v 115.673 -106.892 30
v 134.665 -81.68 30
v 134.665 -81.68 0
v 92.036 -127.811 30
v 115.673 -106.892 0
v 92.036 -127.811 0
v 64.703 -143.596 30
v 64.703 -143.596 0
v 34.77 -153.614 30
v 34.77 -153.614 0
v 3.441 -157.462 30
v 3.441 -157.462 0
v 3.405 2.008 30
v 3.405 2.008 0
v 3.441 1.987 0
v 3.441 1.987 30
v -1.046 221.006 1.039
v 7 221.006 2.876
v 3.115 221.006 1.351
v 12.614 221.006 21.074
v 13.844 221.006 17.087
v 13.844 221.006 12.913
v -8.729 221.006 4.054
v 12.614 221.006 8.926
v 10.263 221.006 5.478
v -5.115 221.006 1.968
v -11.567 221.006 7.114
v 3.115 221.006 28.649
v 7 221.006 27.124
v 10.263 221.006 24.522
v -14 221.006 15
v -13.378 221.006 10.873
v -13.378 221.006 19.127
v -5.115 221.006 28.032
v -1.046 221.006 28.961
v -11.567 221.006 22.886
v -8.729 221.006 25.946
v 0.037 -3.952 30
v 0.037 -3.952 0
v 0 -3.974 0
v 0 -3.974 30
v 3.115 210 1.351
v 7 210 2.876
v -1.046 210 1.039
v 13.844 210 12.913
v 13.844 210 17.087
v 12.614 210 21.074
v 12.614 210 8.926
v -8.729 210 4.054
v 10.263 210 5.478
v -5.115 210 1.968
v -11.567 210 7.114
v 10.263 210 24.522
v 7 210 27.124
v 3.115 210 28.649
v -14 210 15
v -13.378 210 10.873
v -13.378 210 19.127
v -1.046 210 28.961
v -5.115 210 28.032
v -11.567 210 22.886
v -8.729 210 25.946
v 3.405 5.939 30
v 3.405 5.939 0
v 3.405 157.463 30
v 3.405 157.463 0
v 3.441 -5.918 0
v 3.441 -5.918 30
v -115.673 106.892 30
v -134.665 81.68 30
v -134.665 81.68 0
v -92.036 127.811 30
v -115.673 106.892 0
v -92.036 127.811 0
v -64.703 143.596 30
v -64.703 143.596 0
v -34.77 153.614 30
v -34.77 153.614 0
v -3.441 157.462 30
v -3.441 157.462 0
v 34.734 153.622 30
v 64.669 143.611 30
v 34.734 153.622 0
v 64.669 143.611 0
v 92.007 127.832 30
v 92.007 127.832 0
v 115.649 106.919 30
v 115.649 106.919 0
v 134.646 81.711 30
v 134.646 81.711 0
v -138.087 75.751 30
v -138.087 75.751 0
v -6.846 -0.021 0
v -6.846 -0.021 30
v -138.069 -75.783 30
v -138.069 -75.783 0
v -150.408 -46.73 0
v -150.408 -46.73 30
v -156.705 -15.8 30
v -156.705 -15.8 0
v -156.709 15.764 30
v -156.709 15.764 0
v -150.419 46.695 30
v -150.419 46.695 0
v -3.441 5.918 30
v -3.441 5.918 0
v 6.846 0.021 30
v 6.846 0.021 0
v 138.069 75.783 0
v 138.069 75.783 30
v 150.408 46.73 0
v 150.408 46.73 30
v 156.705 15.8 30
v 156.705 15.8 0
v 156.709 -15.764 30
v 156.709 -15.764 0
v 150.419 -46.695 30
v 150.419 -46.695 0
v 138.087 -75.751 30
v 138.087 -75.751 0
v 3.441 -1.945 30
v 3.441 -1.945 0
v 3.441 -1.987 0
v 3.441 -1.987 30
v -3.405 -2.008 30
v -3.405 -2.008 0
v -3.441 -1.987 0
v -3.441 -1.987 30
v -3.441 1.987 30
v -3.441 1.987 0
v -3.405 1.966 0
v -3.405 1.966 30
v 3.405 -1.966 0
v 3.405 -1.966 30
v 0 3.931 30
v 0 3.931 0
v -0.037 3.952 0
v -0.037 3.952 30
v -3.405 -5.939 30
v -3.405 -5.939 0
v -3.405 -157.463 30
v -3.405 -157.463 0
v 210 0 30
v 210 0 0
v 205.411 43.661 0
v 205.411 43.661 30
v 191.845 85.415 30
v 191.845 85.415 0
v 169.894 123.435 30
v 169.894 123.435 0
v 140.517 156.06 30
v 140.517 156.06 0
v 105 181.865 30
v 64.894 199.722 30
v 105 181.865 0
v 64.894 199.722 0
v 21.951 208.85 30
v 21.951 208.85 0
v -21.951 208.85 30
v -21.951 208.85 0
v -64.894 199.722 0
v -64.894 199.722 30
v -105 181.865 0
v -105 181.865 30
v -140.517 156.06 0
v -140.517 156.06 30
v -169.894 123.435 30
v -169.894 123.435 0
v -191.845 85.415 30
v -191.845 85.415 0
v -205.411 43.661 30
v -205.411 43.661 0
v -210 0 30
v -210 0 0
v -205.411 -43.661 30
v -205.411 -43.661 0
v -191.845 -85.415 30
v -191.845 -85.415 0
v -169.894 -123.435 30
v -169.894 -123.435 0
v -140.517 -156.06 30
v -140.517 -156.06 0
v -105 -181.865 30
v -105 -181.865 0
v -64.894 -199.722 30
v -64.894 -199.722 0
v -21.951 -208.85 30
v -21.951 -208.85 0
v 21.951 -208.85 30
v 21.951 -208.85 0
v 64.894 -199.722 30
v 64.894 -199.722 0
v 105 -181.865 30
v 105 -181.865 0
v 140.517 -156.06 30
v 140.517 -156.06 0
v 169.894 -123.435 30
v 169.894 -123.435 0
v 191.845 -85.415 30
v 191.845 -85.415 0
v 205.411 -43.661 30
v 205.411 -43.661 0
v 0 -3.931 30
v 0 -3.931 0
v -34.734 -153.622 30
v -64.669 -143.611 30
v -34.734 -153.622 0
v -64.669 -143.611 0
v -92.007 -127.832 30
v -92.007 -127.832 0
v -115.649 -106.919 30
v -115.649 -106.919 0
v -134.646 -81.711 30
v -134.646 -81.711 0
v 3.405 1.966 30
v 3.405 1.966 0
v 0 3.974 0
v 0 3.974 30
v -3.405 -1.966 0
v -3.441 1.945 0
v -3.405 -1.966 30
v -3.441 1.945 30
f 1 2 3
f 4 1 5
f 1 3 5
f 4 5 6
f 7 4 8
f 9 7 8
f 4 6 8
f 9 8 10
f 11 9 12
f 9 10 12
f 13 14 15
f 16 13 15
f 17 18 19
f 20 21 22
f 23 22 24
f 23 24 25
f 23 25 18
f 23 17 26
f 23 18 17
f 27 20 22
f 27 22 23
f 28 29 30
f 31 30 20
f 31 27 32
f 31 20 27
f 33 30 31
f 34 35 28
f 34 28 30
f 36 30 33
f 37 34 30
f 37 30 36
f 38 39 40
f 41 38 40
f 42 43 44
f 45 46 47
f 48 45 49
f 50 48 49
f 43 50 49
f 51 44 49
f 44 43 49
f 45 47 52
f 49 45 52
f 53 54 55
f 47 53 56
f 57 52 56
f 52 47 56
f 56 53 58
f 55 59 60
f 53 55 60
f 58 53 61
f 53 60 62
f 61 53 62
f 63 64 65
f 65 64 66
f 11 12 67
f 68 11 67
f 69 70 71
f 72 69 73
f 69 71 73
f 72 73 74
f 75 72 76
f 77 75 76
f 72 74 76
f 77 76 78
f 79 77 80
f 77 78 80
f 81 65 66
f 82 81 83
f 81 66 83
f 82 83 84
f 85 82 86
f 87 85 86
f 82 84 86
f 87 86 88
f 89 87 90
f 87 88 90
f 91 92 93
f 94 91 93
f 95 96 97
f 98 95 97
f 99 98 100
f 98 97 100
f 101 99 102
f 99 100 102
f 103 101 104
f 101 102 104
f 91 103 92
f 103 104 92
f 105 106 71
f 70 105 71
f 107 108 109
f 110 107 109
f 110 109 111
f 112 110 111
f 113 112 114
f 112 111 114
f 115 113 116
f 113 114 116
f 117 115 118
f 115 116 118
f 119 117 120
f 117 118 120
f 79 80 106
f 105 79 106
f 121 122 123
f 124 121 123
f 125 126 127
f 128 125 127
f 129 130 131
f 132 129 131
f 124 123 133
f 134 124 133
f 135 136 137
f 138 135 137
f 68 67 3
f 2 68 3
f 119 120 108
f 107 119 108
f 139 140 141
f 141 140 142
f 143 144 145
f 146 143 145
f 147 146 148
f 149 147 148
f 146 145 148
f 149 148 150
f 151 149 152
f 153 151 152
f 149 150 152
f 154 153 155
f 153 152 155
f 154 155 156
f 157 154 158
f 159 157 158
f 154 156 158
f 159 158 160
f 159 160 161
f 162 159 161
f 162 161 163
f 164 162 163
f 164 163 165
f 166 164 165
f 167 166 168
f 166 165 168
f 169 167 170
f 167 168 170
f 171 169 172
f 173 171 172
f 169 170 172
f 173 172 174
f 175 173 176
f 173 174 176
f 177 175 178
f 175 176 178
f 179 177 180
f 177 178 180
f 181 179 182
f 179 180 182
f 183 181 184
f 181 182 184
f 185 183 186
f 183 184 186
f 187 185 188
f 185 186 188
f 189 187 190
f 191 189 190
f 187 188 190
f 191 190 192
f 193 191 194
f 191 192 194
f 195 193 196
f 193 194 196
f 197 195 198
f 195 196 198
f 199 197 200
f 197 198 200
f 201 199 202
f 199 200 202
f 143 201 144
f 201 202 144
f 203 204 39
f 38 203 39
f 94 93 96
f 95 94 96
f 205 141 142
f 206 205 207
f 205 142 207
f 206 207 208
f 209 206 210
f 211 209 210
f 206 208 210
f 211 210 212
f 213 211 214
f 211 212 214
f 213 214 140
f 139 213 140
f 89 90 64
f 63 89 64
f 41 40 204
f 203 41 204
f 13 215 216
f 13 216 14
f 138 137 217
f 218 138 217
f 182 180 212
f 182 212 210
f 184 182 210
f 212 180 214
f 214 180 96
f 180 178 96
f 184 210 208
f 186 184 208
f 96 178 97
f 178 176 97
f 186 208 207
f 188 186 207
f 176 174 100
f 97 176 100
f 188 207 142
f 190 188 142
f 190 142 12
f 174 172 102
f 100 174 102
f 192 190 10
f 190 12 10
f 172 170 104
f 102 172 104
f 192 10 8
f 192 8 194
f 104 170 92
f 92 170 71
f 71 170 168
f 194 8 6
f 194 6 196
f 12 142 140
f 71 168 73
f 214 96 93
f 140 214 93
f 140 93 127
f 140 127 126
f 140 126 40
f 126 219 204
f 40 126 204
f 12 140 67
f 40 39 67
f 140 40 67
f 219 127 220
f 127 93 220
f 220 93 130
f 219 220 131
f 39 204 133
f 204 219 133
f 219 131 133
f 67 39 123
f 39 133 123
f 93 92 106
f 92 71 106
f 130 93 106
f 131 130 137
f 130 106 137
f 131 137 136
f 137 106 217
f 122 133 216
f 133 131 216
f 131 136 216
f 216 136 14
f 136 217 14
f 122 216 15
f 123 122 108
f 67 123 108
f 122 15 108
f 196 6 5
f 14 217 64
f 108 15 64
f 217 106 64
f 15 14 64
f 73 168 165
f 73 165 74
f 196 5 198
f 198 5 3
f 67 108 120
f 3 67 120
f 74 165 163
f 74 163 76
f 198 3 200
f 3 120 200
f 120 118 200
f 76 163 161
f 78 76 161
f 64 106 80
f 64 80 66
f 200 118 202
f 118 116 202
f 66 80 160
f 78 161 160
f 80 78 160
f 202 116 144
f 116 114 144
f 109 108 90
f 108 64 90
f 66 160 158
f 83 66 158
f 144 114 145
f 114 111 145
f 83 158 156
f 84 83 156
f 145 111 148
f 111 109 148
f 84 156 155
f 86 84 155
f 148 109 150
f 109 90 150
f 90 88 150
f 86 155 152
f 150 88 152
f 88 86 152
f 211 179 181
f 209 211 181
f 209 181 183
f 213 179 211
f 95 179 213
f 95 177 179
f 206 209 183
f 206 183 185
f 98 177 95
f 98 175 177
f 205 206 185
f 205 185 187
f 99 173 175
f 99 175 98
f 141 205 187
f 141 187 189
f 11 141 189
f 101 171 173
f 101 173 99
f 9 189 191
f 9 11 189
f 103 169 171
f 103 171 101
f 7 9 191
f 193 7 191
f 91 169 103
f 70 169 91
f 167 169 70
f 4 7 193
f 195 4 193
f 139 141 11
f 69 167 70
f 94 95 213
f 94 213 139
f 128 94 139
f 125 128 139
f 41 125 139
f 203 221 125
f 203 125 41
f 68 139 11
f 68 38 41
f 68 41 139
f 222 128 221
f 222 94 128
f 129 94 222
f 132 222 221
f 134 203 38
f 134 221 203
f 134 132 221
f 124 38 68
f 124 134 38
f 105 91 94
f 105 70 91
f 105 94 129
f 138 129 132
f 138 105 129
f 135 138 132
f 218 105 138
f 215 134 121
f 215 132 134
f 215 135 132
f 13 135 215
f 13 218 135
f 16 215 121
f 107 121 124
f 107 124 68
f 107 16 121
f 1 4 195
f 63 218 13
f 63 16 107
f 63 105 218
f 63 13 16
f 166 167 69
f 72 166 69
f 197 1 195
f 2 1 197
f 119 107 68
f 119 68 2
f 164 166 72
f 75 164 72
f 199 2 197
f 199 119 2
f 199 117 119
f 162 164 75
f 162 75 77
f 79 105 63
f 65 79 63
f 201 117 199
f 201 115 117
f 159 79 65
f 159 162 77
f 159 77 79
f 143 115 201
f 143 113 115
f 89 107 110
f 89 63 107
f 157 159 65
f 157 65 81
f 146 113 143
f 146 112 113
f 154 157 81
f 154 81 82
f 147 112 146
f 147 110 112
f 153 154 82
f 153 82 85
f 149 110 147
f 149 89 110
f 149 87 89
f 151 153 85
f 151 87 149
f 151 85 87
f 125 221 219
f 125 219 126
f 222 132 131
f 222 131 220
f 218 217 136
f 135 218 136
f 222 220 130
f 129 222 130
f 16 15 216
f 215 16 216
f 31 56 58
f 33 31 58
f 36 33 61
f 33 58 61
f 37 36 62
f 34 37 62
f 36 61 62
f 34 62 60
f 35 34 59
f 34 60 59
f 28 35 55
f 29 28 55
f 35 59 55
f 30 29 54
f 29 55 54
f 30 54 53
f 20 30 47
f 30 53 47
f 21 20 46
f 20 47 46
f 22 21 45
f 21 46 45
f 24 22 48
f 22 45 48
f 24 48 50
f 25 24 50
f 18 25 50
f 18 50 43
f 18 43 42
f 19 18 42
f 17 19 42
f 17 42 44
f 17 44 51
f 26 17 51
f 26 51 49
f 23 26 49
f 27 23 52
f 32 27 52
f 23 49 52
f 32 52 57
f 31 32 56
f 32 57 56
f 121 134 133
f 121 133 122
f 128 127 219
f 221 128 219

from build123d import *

# Parameters (mm, degrees)
SKETCH_1_R      = 210
EXTRUDE_1_DEPTH = 30
SKETCH_2_R      = 14
EXTRUDE_2_DEPTH = 11.005890415


with BuildPart() as part:
    # 草图1 → 凸台-拉伸1 (new body)
    with BuildSketch(Plane.XY):
        Circle(SKETCH_1_R)
        with BuildLine():
            Line((-134.645818325, -81.711404391), (-3.404633286, -5.93927088))
            Line((-3.404633286, -5.93927088), (-3.404633286, -157.463197199))
            ThreePointArc((-3.404633286, -157.463197199), (-78.73414333, -136.40815472), (-134.645818325, -81.711404391))
        make_face(mode=Mode.SUBTRACT)
        with BuildLine():
            Line((-138.087061144, 75.750996987), (-6.845876106, -0.021136524))
            Line((-6.845876106, -0.021136524), (-138.069445579, -75.783099683))
            ThreePointArc((-138.069445579, -75.783099683), (-157.499998936, -0.018309091), (-138.087061144, 75.750996987))
        make_face(mode=Mode.SUBTRACT)
        Polygon((-3.441242819, -1.986802468), (-3.404633286, -1.965665944), (-3.404633286, -2.007938992), align=None, mode=Mode.SUBTRACT)
        with BuildLine():
            Line((3.441242819, -157.462401378), (3.441242819, -5.918134357))
            Line((3.441242819, -5.918134357), (134.664812292, -81.680097516))
            ThreePointArc((134.664812292, -81.680097516), (78.765855606, -136.389845629), (3.441242819, -157.462401378))
        make_face(mode=Mode.SUBTRACT)
        Polygon((0, -3.931331889), (0.036609533, -3.952468412), (0, -3.973604936), align=None, mode=Mode.SUBTRACT)
        Polygon((3.404633286, -1.965665944), (3.441242819, -1.944529421), (3.441242819, -1.986802468), align=None, mode=Mode.SUBTRACT)
        Polygon((-3.441242819, 1.986802468), (-3.404633286, 1.965665944), (-3.441242819, 1.944529421), align=None, mode=Mode.SUBTRACT)
        Polygon((0, 3.973604936), (0, 3.931331889), (-0.036609533, 3.952468412), align=None, mode=Mode.SUBTRACT)
        with BuildLine():
            Line((-3.441242819, 157.462401378), (-3.441242819, 5.918134357))
            Line((-3.441242819, 5.918134357), (-134.664812292, 81.680097516))
            ThreePointArc((-134.664812292, 81.680097516), (-78.765855606, 136.389845629), (-3.441242819, 157.462401378))
        make_face(mode=Mode.SUBTRACT)
        Polygon((3.441242819, 1.986802468), (3.404633286, 1.965665944), (3.404633286, 2.007938992), align=None, mode=Mode.SUBTRACT)
        with BuildLine():
            Line((138.087061144, -75.750996987), (6.845876106, 0.021136524))
            Line((6.845876106, 0.021136524), (138.069445579, 75.783099683))
            ThreePointArc((138.069445579, 75.783099683), (157.499998936, 0.018309091), (138.087061144, -75.750996987))
        make_face(mode=Mode.SUBTRACT)
        with BuildLine():
            Line((134.645818325, 81.711404391), (3.404633286, 5.93927088))
            Line((3.404633286, 5.93927088), (3.404633286, 157.463197199))
            ThreePointArc((3.404633286, 157.463197199), (78.73414333, 136.40815472), (134.645818325, 81.711404391))
        make_face(mode=Mode.SUBTRACT)
    extrude(amount=EXTRUDE_1_DEPTH)


with BuildPart() as body_2:
    # 草图2 → 凸台-拉伸2 (new body)
    with BuildSketch(Plane(origin=(0, 210, 0), x_dir=(1, 0, 0), z_dir=(0, 1, 0))):
        with Locations(Location((0, -15, 0), (0, 0, 180))):
            Circle(SKETCH_2_R)
    extrude(amount=EXTRUDE_2_DEPTH)


solid = Compound([part.part, body_2.part])
